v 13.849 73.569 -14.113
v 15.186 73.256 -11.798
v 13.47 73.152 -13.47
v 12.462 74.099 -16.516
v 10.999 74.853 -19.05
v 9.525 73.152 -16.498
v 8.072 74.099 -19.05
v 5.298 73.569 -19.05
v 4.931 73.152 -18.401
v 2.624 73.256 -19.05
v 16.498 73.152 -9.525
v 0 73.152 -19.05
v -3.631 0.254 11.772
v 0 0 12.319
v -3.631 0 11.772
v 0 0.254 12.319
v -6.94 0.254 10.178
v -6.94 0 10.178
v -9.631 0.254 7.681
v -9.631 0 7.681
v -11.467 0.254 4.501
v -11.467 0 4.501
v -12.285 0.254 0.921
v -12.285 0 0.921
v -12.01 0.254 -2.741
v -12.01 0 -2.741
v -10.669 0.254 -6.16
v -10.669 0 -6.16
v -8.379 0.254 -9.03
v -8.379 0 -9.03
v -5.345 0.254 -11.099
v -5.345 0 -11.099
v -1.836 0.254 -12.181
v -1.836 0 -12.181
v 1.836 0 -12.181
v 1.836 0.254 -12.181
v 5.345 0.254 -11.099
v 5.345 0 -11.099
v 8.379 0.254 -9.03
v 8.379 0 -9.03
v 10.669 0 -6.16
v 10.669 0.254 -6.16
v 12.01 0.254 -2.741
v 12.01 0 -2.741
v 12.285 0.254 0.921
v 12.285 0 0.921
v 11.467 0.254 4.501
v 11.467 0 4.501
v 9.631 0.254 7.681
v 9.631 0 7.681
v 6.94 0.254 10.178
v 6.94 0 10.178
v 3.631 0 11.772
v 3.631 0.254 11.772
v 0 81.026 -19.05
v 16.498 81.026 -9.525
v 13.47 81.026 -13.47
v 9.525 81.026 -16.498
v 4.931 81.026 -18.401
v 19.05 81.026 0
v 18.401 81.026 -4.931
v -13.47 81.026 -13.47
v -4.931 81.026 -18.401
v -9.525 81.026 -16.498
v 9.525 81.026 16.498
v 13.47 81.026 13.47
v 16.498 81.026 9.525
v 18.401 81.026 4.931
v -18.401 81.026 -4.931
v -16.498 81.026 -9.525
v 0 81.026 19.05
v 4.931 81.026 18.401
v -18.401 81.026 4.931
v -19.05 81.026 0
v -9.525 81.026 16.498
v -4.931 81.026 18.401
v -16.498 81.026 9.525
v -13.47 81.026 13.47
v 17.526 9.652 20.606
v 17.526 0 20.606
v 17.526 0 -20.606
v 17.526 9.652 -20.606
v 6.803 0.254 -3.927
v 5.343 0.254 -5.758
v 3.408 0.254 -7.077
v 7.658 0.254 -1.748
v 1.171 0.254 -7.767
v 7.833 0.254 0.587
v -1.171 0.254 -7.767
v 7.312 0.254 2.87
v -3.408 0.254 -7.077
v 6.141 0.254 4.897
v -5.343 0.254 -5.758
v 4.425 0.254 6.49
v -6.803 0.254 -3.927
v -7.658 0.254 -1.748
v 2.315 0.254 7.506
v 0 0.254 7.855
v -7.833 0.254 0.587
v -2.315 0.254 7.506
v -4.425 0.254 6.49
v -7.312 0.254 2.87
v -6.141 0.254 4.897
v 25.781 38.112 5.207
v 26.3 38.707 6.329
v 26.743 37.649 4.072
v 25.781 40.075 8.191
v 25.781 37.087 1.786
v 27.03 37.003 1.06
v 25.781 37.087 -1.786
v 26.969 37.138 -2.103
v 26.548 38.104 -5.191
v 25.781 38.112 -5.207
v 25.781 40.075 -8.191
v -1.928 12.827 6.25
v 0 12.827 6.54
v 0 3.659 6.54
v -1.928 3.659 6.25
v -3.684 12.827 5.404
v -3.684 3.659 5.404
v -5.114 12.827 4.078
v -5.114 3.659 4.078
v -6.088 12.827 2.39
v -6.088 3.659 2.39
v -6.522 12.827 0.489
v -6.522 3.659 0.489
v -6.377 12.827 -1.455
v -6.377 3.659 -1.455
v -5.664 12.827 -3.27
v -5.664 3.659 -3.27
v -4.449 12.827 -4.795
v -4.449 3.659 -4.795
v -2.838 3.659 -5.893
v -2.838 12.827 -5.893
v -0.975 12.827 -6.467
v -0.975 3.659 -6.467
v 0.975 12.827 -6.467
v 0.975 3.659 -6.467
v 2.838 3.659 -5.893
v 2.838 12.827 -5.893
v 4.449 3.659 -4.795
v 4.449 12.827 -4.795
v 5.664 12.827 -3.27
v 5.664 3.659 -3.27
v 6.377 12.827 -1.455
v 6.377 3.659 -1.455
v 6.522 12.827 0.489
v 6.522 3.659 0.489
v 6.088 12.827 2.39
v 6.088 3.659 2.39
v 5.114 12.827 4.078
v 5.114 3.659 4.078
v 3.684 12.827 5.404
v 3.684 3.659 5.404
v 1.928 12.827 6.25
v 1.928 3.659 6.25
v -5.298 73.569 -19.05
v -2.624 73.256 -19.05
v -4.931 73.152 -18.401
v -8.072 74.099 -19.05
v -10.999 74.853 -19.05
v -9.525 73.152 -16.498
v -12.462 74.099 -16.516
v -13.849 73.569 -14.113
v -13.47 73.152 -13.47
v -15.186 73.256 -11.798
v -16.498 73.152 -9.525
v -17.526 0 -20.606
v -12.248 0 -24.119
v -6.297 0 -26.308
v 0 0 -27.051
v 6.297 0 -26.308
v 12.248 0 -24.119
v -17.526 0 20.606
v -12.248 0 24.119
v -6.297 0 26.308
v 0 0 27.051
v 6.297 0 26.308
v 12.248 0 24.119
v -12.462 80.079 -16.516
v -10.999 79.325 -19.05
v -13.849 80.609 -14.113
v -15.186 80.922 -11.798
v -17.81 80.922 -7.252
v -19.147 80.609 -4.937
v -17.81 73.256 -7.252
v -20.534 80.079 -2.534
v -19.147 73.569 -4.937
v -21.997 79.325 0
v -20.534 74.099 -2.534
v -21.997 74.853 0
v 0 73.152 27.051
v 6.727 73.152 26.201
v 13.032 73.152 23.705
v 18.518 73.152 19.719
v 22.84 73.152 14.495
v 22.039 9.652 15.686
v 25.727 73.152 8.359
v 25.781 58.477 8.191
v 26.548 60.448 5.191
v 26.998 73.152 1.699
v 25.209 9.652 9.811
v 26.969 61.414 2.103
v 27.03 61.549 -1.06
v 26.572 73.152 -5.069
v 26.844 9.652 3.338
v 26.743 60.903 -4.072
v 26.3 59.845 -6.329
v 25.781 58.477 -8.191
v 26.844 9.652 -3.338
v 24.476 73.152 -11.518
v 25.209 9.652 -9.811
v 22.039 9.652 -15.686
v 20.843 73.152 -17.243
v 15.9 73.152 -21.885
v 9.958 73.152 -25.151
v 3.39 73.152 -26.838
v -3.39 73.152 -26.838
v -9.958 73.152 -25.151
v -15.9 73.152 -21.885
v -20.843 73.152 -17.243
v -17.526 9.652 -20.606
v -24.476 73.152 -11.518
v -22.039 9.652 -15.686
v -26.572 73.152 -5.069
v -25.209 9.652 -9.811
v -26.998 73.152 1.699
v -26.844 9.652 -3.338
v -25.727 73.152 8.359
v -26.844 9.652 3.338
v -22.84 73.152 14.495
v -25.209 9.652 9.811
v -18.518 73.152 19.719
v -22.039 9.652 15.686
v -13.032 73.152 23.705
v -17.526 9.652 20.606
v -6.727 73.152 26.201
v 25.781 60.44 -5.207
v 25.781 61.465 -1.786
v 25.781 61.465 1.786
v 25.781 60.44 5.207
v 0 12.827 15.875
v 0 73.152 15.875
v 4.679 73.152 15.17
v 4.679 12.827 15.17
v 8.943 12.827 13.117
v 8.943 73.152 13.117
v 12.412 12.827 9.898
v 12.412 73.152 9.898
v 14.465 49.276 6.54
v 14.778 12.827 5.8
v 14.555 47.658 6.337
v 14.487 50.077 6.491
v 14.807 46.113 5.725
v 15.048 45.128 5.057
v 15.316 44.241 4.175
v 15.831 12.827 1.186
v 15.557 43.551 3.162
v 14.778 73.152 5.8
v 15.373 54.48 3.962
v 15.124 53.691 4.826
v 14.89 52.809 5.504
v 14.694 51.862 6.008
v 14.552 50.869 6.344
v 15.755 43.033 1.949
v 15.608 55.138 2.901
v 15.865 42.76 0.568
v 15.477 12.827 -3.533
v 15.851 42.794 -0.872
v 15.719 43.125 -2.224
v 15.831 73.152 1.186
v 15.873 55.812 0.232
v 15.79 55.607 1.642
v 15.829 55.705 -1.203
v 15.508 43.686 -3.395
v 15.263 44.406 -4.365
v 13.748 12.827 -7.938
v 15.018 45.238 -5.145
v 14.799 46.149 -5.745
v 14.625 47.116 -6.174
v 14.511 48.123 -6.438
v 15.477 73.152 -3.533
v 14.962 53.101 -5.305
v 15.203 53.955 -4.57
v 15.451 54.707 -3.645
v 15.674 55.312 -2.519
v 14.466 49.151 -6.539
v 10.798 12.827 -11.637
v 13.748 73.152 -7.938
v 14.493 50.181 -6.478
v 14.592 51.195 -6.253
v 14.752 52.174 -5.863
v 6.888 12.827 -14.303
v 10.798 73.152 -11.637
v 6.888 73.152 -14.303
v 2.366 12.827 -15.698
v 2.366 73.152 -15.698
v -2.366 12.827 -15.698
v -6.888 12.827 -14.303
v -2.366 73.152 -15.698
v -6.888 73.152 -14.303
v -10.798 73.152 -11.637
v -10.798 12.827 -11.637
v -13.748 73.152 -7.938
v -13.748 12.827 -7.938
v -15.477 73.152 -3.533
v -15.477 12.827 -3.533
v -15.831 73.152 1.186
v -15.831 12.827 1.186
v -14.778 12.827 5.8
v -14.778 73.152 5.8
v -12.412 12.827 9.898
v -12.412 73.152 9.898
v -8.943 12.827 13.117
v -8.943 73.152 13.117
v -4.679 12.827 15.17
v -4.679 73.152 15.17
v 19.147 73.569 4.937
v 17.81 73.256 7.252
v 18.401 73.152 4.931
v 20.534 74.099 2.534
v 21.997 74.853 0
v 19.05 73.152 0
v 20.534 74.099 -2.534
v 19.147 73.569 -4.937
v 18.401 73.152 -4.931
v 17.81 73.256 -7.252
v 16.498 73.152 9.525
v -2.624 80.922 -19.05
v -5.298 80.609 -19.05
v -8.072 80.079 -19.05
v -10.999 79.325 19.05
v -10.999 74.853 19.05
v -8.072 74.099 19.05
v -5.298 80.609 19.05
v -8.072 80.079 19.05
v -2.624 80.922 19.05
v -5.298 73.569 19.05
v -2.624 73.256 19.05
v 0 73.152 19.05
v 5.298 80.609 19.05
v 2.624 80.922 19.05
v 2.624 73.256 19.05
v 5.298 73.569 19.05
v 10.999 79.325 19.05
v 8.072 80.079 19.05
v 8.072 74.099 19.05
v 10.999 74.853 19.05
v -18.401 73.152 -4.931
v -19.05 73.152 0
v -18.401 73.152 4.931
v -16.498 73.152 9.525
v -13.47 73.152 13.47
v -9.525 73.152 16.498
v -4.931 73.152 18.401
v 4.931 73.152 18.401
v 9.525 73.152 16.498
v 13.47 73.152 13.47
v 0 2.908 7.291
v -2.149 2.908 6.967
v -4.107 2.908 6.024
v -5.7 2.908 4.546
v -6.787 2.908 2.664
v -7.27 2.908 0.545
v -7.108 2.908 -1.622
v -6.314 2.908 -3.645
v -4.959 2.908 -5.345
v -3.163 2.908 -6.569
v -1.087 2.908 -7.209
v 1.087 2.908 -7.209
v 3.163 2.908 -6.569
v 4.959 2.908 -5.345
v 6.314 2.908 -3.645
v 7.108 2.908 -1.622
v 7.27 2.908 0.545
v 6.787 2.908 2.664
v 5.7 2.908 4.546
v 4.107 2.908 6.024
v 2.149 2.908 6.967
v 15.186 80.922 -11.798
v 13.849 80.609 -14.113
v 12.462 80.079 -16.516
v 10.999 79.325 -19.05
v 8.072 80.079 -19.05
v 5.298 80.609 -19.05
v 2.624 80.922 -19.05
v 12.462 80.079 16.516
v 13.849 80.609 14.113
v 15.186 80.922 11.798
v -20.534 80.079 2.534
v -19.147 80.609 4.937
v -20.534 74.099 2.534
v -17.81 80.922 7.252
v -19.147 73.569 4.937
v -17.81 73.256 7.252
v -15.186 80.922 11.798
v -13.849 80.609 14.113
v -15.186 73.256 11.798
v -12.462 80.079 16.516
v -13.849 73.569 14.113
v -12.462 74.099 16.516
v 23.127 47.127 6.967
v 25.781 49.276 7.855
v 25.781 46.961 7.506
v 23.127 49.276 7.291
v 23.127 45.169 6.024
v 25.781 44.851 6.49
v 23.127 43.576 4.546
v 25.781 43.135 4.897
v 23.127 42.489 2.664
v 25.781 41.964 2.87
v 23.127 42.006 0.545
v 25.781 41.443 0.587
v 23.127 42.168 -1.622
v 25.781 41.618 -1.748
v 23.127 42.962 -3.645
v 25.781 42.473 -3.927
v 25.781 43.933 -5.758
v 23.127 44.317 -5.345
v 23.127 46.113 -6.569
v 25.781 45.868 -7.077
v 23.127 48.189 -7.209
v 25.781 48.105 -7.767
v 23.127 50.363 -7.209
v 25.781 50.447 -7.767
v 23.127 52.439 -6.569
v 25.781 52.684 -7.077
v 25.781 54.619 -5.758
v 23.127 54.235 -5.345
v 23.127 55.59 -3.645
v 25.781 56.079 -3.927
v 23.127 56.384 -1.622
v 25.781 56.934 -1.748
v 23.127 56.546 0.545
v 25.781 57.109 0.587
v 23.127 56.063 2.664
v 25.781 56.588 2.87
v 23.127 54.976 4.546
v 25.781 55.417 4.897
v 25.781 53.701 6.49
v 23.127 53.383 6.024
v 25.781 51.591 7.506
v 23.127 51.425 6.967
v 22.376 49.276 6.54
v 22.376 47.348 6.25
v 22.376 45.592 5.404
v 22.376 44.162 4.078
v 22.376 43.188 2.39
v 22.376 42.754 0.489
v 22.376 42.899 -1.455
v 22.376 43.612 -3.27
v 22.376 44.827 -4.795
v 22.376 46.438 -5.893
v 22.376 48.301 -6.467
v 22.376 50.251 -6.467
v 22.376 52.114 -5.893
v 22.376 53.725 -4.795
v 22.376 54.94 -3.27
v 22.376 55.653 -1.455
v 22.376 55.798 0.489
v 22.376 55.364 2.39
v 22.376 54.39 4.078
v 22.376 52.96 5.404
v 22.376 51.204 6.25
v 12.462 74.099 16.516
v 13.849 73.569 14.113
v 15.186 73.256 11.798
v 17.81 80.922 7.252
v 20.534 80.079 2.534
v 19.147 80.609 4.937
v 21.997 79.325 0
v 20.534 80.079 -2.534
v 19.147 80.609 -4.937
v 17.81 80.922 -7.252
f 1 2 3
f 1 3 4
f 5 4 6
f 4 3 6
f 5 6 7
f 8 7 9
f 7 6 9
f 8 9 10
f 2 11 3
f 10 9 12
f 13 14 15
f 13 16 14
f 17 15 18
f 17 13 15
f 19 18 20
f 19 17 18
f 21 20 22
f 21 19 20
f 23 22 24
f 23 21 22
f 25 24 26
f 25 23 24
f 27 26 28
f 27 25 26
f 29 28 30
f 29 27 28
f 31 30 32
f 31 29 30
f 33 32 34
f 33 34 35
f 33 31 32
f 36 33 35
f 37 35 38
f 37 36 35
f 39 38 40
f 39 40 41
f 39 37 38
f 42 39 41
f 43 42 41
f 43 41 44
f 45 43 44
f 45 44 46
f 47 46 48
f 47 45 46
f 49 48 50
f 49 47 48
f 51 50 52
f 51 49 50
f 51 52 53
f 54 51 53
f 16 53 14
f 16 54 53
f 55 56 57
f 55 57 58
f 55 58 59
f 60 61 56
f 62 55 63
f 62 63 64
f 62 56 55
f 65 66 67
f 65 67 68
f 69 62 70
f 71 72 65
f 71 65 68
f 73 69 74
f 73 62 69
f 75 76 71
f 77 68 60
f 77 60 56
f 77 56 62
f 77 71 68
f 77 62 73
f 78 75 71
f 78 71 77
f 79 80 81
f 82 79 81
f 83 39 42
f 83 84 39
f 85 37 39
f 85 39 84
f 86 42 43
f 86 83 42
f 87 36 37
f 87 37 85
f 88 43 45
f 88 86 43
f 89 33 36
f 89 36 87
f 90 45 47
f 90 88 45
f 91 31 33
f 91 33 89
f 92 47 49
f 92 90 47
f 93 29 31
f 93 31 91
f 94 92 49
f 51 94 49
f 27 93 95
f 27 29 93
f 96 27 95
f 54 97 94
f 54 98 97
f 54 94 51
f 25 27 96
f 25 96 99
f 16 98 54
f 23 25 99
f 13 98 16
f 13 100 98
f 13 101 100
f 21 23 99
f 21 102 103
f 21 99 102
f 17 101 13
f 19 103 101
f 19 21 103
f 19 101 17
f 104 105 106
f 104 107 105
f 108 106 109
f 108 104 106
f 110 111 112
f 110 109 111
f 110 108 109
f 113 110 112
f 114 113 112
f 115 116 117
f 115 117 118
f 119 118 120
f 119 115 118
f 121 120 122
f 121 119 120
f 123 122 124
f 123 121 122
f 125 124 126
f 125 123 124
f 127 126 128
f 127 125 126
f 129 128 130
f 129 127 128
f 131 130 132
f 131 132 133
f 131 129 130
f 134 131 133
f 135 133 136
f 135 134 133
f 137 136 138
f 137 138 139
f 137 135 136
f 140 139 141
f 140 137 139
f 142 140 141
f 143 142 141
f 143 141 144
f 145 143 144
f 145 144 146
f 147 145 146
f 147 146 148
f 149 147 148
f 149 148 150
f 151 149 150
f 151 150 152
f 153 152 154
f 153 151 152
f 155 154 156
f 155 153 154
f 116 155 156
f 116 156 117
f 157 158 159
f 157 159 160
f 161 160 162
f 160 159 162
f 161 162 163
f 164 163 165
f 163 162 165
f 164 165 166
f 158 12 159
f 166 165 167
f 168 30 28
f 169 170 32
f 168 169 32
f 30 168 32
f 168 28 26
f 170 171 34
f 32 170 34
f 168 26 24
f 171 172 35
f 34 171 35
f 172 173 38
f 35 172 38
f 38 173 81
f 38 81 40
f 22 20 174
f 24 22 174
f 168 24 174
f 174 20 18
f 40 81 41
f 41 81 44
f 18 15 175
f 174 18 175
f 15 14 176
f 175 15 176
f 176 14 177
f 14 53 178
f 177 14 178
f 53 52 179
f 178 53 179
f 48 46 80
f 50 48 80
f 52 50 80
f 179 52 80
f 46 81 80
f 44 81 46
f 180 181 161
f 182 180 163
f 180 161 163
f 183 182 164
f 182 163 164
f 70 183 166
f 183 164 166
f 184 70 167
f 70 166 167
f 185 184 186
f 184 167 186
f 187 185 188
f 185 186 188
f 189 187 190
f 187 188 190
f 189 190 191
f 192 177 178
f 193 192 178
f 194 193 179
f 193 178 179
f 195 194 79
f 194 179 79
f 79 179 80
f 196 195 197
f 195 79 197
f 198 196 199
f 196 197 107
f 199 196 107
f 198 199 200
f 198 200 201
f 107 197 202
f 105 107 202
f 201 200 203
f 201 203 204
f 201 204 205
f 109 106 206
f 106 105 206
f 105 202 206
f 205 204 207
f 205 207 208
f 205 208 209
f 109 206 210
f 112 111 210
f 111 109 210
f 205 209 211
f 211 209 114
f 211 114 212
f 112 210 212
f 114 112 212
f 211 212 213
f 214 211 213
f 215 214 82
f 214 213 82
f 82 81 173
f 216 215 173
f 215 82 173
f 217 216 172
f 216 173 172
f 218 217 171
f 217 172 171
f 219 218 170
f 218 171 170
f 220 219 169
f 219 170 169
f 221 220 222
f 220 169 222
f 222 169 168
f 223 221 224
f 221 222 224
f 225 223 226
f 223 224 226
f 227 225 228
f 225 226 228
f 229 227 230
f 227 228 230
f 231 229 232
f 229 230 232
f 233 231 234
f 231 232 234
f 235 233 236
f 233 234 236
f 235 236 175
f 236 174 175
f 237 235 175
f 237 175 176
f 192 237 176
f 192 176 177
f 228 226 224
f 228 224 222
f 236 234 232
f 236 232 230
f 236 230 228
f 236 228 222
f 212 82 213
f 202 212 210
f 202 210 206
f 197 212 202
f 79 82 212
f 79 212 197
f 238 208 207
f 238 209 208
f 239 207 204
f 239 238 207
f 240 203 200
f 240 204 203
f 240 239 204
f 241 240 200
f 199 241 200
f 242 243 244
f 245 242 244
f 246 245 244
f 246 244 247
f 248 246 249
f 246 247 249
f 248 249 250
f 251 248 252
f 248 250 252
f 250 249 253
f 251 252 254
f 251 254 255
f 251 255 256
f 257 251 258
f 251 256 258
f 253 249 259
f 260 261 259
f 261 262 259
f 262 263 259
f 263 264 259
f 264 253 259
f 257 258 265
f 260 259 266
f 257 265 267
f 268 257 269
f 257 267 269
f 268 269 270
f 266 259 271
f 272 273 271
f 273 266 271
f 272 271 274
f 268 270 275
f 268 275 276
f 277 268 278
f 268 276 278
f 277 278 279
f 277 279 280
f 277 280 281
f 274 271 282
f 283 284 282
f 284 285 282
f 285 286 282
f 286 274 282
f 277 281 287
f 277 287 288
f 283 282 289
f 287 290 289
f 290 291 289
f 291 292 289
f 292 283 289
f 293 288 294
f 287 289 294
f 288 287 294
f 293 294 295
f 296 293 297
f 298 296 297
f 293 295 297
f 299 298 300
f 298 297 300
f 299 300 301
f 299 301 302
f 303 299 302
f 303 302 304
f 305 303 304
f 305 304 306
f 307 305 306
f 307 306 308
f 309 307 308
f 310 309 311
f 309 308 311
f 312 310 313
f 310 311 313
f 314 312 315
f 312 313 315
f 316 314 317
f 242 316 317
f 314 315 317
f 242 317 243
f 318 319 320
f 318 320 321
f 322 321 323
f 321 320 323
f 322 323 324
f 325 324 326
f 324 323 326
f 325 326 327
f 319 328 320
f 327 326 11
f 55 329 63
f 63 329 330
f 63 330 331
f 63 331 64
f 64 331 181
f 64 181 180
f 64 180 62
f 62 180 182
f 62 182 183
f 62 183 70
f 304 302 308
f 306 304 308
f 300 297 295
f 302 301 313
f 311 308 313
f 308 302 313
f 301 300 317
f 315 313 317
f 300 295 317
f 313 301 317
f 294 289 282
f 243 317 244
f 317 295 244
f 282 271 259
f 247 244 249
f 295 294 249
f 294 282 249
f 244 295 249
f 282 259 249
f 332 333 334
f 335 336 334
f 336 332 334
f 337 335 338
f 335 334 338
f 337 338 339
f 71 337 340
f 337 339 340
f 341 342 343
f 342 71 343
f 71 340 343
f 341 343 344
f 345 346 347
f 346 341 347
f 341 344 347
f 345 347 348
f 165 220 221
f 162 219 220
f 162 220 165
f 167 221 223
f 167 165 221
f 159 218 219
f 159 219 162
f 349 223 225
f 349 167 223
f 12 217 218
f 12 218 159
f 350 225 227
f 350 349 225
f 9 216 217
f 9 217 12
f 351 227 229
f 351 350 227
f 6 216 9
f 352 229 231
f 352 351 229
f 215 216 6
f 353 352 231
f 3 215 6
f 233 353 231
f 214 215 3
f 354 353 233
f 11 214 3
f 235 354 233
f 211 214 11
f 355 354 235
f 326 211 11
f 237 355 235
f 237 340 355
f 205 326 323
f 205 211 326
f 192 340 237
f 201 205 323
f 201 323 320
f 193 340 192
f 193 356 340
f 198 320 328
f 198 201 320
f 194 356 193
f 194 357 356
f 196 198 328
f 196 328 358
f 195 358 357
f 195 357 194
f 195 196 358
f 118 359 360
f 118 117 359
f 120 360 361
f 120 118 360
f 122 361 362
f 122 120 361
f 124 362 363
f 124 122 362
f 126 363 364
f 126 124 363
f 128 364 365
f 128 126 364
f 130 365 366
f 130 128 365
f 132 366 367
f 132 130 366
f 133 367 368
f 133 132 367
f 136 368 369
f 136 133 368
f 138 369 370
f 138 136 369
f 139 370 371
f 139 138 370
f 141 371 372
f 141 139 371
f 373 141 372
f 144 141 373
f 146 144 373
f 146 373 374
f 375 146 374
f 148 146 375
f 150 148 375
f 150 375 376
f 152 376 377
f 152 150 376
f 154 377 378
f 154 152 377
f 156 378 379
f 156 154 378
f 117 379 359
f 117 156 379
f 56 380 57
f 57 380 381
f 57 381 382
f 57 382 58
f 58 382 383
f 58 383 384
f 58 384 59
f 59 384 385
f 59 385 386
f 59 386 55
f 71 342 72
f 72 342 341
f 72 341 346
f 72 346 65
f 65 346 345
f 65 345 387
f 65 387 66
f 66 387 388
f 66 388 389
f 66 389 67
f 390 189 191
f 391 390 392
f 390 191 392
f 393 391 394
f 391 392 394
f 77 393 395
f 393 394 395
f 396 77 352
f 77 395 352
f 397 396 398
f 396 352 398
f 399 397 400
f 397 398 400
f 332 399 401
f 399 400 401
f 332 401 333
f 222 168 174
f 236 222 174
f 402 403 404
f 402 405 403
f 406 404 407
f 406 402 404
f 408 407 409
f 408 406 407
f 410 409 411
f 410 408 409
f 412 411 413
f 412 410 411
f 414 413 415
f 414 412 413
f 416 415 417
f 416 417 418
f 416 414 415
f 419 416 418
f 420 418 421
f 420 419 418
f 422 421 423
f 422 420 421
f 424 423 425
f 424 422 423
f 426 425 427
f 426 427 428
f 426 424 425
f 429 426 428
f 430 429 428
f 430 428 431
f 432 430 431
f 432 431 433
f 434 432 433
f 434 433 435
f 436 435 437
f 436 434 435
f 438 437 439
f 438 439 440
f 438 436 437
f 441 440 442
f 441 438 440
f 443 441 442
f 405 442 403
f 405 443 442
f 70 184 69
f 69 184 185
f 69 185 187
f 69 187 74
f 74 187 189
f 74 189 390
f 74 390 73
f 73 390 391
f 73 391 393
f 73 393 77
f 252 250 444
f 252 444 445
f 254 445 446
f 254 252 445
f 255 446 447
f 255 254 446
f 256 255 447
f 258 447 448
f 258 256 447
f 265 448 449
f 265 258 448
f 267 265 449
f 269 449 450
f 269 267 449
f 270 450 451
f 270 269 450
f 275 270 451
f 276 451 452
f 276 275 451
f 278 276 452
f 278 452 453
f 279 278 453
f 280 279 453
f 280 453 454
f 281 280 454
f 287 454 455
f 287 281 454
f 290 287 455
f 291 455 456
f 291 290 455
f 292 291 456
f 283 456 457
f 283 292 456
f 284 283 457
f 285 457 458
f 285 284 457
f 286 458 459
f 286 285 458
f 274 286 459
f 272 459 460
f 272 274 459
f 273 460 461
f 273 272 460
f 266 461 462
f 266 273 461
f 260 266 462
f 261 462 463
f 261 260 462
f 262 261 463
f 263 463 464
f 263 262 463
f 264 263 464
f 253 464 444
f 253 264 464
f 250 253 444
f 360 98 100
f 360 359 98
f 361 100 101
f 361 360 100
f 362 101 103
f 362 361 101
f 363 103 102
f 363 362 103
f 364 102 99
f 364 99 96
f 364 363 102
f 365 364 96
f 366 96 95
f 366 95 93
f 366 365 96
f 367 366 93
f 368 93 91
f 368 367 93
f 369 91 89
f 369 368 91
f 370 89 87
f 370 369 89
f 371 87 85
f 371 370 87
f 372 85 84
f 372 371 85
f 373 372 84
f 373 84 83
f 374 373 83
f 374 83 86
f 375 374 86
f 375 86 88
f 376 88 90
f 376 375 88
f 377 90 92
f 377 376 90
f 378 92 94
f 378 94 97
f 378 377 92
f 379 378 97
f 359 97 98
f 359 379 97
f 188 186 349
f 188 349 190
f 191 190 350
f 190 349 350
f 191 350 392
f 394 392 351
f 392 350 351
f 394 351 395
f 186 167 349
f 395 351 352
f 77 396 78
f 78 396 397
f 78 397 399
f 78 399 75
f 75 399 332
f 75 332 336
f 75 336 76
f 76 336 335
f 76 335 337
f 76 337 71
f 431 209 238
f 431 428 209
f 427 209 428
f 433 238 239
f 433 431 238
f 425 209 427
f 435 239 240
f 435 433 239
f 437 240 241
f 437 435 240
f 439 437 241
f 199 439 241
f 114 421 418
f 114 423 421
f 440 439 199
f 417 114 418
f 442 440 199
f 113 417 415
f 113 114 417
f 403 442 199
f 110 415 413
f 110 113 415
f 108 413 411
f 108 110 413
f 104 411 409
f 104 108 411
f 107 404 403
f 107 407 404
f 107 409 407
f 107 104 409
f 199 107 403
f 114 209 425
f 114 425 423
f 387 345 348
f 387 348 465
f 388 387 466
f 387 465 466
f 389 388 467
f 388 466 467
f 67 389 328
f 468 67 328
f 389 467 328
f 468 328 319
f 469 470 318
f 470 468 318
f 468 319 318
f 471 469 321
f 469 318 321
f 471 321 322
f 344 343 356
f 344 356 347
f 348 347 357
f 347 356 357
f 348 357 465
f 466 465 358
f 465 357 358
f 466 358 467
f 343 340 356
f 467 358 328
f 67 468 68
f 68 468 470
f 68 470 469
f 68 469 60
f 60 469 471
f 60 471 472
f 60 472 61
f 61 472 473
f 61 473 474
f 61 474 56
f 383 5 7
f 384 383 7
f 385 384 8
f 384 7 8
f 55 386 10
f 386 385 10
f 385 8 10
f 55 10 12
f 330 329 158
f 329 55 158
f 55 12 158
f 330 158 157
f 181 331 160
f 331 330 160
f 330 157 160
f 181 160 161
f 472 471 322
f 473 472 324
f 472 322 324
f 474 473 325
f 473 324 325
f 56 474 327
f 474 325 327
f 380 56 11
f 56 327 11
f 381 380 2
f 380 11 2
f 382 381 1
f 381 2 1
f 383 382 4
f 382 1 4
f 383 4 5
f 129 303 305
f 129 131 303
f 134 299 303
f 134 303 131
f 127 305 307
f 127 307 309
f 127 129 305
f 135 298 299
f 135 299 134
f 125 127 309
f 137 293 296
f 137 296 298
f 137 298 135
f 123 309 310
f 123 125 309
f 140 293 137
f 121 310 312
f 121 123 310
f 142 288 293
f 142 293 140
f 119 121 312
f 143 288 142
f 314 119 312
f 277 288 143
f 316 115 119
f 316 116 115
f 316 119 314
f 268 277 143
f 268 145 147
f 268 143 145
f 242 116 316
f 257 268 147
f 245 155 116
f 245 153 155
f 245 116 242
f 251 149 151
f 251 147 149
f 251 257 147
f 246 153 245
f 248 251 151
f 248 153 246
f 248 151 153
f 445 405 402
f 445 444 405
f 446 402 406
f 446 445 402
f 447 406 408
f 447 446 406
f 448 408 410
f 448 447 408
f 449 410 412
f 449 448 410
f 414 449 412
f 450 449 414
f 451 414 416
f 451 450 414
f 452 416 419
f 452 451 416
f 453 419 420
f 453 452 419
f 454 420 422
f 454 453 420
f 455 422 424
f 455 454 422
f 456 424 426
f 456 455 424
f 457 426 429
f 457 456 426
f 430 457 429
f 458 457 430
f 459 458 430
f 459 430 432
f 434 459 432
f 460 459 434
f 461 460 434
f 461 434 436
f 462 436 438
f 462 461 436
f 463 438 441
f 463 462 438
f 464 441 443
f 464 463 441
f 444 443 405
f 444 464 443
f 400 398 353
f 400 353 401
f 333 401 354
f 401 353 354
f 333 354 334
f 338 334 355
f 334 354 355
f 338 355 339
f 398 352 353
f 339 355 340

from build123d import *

# Parameters (mm, degrees)
SKETCH1_R          = 27.051
EXTRUDE1_DEPTH     = 73.152
CUT_EXTRUDE1_DEPTH = 9.652
EXTRUDE2_DEPTH     = 7.874
SKETCH7_W          = 15.875
SKETCH7_H          = 60.325


with BuildPart() as part:
    # Sketch1 → Extrude1 (new body)
    with BuildSketch(Plane(origin=(0, 0, 0), x_dir=(1, 0, 0), z_dir=(0, 1, 0))):
        with Locations(Location((0, 0, 0), (0, 0, 270))):  # turned: the seam where the file's is
            Circle(SKETCH1_R)
    extrude(amount=EXTRUDE1_DEPTH)

    # Sketch2 → Cut-Extrude1 (cut)
    with BuildSketch(Plane.XZ):
        with BuildLine():
            Line((17.526, 20.605725539), (17.526, -20.605725539))
            ThreePointArc((17.526, -20.605725539), (27.051, 0), (17.526, 20.605725539))
        make_face()
        with BuildLine():
            Line((-17.526, -20.605725539), (-17.526, 20.605725539))
            ThreePointArc((-17.526, 20.605725539), (-27.051, 0), (-17.526, -20.605725539))
        make_face()
    extrude(amount=-CUT_EXTRUDE1_DEPTH, mode=Mode.SUBTRACT)

    # S2D0007 → Cut-Revolve1 (revolve, cut)
    with BuildSketch(Plane(origin=(27.051, 49.276, 0), x_dir=(0, -1, 0), z_dir=(0, 0, 1)), mode=Mode.PRIVATE) as cut_revolve1_sk:
        Polygon((0, 0), (12.319, 0), (12.319, -1.27), (7.85495, -1.27), (7.290761118, -3.9243), (6.5405, -4.674561118), (6.5405, -16.7386), (0, -20.668528879), align=None)
    revolve(cut_revolve1_sk.sketch.rotate(Axis((-4.448190263, 49.276, 0), (1, 0, 0)), 270), axis=Axis((-4.448190263, 49.276, 0), (1, 0, 0)), mode=Mode.SUBTRACT)  # turned: the seam where the file's is

    # Sketch4 → Cut-Revolve2 (revolve, cut)
    with BuildSketch(Plane(origin=(0, 0, 0), x_dir=(-1, 0, 0), z_dir=(0, 0, 1)), mode=Mode.PRIVATE) as cut_revolve2_sk:
        Polygon((0, 0), (12.319, 0), (12.319, -0.254), (7.85495, -0.254), (7.290761118, -2.9083), (6.5405, -3.658561118), (6.5405, -15.7226), (0, -19.652528879), align=None)
    revolve(cut_revolve2_sk.sketch.rotate(Axis((0, 25.899297965, 0), (0, -1, 0)), 270), axis=Axis((0, 25.899297965, 0), (0, -1, 0)), mode=Mode.SUBTRACT)  # turned: the seam where the file's is

    # Sketch5 → Extrude2 (add)
    with BuildSketch(Plane(origin=(0, 73.152, 0), x_dir=(-1, 0, 0), z_dir=(0, 1, 0))):
        Polygon((21.997045256, 0), (10.998522628, 19.05), (-10.998522628, 19.05), (-21.997045256, 0), (-10.998522628, -19.05), (10.998522628, -19.05), align=None)
    extrude(amount=EXTRUDE2_DEPTH)

    # Sketch6 → Cut-Revolve3 (revolve, cut)
    with BuildSketch(Plane(origin=(0, 0, 0), x_dir=(0, 0, -1), z_dir=(1, 0, 0)), mode=Mode.PRIVATE) as cut_revolve3_sk:
        Polygon((19.05, 81.026), (25.869084029, 77.089), (19.05, 73.152), (31.75, 73.152), (31.75, 81.026), align=None)
    revolve(cut_revolve3_sk.sketch.rotate(Axis((0, 72.7583, 0), (0, 1, 0)), 180), axis=Axis((0, 72.7583, 0), (0, 1, 0)), mode=Mode.SUBTRACT)  # turned: the seam where the file's is

    # Sketch7 → Cut-Revolve4 (revolve, cut)
    with BuildSketch(Plane.XY, mode=Mode.PRIVATE) as cut_revolve4_sk:
        with Locations((-7.9375, 42.9895)):
            Rectangle(SKETCH7_W, SKETCH7_H)
    revolve(cut_revolve4_sk.sketch.rotate(Axis((0, 0, 0), (0, 1, 0)), 90), axis=Axis((0, 0, 0), (0, 1, 0)), mode=Mode.SUBTRACT)  # turned: the seam where the file's is


solid = part.part
